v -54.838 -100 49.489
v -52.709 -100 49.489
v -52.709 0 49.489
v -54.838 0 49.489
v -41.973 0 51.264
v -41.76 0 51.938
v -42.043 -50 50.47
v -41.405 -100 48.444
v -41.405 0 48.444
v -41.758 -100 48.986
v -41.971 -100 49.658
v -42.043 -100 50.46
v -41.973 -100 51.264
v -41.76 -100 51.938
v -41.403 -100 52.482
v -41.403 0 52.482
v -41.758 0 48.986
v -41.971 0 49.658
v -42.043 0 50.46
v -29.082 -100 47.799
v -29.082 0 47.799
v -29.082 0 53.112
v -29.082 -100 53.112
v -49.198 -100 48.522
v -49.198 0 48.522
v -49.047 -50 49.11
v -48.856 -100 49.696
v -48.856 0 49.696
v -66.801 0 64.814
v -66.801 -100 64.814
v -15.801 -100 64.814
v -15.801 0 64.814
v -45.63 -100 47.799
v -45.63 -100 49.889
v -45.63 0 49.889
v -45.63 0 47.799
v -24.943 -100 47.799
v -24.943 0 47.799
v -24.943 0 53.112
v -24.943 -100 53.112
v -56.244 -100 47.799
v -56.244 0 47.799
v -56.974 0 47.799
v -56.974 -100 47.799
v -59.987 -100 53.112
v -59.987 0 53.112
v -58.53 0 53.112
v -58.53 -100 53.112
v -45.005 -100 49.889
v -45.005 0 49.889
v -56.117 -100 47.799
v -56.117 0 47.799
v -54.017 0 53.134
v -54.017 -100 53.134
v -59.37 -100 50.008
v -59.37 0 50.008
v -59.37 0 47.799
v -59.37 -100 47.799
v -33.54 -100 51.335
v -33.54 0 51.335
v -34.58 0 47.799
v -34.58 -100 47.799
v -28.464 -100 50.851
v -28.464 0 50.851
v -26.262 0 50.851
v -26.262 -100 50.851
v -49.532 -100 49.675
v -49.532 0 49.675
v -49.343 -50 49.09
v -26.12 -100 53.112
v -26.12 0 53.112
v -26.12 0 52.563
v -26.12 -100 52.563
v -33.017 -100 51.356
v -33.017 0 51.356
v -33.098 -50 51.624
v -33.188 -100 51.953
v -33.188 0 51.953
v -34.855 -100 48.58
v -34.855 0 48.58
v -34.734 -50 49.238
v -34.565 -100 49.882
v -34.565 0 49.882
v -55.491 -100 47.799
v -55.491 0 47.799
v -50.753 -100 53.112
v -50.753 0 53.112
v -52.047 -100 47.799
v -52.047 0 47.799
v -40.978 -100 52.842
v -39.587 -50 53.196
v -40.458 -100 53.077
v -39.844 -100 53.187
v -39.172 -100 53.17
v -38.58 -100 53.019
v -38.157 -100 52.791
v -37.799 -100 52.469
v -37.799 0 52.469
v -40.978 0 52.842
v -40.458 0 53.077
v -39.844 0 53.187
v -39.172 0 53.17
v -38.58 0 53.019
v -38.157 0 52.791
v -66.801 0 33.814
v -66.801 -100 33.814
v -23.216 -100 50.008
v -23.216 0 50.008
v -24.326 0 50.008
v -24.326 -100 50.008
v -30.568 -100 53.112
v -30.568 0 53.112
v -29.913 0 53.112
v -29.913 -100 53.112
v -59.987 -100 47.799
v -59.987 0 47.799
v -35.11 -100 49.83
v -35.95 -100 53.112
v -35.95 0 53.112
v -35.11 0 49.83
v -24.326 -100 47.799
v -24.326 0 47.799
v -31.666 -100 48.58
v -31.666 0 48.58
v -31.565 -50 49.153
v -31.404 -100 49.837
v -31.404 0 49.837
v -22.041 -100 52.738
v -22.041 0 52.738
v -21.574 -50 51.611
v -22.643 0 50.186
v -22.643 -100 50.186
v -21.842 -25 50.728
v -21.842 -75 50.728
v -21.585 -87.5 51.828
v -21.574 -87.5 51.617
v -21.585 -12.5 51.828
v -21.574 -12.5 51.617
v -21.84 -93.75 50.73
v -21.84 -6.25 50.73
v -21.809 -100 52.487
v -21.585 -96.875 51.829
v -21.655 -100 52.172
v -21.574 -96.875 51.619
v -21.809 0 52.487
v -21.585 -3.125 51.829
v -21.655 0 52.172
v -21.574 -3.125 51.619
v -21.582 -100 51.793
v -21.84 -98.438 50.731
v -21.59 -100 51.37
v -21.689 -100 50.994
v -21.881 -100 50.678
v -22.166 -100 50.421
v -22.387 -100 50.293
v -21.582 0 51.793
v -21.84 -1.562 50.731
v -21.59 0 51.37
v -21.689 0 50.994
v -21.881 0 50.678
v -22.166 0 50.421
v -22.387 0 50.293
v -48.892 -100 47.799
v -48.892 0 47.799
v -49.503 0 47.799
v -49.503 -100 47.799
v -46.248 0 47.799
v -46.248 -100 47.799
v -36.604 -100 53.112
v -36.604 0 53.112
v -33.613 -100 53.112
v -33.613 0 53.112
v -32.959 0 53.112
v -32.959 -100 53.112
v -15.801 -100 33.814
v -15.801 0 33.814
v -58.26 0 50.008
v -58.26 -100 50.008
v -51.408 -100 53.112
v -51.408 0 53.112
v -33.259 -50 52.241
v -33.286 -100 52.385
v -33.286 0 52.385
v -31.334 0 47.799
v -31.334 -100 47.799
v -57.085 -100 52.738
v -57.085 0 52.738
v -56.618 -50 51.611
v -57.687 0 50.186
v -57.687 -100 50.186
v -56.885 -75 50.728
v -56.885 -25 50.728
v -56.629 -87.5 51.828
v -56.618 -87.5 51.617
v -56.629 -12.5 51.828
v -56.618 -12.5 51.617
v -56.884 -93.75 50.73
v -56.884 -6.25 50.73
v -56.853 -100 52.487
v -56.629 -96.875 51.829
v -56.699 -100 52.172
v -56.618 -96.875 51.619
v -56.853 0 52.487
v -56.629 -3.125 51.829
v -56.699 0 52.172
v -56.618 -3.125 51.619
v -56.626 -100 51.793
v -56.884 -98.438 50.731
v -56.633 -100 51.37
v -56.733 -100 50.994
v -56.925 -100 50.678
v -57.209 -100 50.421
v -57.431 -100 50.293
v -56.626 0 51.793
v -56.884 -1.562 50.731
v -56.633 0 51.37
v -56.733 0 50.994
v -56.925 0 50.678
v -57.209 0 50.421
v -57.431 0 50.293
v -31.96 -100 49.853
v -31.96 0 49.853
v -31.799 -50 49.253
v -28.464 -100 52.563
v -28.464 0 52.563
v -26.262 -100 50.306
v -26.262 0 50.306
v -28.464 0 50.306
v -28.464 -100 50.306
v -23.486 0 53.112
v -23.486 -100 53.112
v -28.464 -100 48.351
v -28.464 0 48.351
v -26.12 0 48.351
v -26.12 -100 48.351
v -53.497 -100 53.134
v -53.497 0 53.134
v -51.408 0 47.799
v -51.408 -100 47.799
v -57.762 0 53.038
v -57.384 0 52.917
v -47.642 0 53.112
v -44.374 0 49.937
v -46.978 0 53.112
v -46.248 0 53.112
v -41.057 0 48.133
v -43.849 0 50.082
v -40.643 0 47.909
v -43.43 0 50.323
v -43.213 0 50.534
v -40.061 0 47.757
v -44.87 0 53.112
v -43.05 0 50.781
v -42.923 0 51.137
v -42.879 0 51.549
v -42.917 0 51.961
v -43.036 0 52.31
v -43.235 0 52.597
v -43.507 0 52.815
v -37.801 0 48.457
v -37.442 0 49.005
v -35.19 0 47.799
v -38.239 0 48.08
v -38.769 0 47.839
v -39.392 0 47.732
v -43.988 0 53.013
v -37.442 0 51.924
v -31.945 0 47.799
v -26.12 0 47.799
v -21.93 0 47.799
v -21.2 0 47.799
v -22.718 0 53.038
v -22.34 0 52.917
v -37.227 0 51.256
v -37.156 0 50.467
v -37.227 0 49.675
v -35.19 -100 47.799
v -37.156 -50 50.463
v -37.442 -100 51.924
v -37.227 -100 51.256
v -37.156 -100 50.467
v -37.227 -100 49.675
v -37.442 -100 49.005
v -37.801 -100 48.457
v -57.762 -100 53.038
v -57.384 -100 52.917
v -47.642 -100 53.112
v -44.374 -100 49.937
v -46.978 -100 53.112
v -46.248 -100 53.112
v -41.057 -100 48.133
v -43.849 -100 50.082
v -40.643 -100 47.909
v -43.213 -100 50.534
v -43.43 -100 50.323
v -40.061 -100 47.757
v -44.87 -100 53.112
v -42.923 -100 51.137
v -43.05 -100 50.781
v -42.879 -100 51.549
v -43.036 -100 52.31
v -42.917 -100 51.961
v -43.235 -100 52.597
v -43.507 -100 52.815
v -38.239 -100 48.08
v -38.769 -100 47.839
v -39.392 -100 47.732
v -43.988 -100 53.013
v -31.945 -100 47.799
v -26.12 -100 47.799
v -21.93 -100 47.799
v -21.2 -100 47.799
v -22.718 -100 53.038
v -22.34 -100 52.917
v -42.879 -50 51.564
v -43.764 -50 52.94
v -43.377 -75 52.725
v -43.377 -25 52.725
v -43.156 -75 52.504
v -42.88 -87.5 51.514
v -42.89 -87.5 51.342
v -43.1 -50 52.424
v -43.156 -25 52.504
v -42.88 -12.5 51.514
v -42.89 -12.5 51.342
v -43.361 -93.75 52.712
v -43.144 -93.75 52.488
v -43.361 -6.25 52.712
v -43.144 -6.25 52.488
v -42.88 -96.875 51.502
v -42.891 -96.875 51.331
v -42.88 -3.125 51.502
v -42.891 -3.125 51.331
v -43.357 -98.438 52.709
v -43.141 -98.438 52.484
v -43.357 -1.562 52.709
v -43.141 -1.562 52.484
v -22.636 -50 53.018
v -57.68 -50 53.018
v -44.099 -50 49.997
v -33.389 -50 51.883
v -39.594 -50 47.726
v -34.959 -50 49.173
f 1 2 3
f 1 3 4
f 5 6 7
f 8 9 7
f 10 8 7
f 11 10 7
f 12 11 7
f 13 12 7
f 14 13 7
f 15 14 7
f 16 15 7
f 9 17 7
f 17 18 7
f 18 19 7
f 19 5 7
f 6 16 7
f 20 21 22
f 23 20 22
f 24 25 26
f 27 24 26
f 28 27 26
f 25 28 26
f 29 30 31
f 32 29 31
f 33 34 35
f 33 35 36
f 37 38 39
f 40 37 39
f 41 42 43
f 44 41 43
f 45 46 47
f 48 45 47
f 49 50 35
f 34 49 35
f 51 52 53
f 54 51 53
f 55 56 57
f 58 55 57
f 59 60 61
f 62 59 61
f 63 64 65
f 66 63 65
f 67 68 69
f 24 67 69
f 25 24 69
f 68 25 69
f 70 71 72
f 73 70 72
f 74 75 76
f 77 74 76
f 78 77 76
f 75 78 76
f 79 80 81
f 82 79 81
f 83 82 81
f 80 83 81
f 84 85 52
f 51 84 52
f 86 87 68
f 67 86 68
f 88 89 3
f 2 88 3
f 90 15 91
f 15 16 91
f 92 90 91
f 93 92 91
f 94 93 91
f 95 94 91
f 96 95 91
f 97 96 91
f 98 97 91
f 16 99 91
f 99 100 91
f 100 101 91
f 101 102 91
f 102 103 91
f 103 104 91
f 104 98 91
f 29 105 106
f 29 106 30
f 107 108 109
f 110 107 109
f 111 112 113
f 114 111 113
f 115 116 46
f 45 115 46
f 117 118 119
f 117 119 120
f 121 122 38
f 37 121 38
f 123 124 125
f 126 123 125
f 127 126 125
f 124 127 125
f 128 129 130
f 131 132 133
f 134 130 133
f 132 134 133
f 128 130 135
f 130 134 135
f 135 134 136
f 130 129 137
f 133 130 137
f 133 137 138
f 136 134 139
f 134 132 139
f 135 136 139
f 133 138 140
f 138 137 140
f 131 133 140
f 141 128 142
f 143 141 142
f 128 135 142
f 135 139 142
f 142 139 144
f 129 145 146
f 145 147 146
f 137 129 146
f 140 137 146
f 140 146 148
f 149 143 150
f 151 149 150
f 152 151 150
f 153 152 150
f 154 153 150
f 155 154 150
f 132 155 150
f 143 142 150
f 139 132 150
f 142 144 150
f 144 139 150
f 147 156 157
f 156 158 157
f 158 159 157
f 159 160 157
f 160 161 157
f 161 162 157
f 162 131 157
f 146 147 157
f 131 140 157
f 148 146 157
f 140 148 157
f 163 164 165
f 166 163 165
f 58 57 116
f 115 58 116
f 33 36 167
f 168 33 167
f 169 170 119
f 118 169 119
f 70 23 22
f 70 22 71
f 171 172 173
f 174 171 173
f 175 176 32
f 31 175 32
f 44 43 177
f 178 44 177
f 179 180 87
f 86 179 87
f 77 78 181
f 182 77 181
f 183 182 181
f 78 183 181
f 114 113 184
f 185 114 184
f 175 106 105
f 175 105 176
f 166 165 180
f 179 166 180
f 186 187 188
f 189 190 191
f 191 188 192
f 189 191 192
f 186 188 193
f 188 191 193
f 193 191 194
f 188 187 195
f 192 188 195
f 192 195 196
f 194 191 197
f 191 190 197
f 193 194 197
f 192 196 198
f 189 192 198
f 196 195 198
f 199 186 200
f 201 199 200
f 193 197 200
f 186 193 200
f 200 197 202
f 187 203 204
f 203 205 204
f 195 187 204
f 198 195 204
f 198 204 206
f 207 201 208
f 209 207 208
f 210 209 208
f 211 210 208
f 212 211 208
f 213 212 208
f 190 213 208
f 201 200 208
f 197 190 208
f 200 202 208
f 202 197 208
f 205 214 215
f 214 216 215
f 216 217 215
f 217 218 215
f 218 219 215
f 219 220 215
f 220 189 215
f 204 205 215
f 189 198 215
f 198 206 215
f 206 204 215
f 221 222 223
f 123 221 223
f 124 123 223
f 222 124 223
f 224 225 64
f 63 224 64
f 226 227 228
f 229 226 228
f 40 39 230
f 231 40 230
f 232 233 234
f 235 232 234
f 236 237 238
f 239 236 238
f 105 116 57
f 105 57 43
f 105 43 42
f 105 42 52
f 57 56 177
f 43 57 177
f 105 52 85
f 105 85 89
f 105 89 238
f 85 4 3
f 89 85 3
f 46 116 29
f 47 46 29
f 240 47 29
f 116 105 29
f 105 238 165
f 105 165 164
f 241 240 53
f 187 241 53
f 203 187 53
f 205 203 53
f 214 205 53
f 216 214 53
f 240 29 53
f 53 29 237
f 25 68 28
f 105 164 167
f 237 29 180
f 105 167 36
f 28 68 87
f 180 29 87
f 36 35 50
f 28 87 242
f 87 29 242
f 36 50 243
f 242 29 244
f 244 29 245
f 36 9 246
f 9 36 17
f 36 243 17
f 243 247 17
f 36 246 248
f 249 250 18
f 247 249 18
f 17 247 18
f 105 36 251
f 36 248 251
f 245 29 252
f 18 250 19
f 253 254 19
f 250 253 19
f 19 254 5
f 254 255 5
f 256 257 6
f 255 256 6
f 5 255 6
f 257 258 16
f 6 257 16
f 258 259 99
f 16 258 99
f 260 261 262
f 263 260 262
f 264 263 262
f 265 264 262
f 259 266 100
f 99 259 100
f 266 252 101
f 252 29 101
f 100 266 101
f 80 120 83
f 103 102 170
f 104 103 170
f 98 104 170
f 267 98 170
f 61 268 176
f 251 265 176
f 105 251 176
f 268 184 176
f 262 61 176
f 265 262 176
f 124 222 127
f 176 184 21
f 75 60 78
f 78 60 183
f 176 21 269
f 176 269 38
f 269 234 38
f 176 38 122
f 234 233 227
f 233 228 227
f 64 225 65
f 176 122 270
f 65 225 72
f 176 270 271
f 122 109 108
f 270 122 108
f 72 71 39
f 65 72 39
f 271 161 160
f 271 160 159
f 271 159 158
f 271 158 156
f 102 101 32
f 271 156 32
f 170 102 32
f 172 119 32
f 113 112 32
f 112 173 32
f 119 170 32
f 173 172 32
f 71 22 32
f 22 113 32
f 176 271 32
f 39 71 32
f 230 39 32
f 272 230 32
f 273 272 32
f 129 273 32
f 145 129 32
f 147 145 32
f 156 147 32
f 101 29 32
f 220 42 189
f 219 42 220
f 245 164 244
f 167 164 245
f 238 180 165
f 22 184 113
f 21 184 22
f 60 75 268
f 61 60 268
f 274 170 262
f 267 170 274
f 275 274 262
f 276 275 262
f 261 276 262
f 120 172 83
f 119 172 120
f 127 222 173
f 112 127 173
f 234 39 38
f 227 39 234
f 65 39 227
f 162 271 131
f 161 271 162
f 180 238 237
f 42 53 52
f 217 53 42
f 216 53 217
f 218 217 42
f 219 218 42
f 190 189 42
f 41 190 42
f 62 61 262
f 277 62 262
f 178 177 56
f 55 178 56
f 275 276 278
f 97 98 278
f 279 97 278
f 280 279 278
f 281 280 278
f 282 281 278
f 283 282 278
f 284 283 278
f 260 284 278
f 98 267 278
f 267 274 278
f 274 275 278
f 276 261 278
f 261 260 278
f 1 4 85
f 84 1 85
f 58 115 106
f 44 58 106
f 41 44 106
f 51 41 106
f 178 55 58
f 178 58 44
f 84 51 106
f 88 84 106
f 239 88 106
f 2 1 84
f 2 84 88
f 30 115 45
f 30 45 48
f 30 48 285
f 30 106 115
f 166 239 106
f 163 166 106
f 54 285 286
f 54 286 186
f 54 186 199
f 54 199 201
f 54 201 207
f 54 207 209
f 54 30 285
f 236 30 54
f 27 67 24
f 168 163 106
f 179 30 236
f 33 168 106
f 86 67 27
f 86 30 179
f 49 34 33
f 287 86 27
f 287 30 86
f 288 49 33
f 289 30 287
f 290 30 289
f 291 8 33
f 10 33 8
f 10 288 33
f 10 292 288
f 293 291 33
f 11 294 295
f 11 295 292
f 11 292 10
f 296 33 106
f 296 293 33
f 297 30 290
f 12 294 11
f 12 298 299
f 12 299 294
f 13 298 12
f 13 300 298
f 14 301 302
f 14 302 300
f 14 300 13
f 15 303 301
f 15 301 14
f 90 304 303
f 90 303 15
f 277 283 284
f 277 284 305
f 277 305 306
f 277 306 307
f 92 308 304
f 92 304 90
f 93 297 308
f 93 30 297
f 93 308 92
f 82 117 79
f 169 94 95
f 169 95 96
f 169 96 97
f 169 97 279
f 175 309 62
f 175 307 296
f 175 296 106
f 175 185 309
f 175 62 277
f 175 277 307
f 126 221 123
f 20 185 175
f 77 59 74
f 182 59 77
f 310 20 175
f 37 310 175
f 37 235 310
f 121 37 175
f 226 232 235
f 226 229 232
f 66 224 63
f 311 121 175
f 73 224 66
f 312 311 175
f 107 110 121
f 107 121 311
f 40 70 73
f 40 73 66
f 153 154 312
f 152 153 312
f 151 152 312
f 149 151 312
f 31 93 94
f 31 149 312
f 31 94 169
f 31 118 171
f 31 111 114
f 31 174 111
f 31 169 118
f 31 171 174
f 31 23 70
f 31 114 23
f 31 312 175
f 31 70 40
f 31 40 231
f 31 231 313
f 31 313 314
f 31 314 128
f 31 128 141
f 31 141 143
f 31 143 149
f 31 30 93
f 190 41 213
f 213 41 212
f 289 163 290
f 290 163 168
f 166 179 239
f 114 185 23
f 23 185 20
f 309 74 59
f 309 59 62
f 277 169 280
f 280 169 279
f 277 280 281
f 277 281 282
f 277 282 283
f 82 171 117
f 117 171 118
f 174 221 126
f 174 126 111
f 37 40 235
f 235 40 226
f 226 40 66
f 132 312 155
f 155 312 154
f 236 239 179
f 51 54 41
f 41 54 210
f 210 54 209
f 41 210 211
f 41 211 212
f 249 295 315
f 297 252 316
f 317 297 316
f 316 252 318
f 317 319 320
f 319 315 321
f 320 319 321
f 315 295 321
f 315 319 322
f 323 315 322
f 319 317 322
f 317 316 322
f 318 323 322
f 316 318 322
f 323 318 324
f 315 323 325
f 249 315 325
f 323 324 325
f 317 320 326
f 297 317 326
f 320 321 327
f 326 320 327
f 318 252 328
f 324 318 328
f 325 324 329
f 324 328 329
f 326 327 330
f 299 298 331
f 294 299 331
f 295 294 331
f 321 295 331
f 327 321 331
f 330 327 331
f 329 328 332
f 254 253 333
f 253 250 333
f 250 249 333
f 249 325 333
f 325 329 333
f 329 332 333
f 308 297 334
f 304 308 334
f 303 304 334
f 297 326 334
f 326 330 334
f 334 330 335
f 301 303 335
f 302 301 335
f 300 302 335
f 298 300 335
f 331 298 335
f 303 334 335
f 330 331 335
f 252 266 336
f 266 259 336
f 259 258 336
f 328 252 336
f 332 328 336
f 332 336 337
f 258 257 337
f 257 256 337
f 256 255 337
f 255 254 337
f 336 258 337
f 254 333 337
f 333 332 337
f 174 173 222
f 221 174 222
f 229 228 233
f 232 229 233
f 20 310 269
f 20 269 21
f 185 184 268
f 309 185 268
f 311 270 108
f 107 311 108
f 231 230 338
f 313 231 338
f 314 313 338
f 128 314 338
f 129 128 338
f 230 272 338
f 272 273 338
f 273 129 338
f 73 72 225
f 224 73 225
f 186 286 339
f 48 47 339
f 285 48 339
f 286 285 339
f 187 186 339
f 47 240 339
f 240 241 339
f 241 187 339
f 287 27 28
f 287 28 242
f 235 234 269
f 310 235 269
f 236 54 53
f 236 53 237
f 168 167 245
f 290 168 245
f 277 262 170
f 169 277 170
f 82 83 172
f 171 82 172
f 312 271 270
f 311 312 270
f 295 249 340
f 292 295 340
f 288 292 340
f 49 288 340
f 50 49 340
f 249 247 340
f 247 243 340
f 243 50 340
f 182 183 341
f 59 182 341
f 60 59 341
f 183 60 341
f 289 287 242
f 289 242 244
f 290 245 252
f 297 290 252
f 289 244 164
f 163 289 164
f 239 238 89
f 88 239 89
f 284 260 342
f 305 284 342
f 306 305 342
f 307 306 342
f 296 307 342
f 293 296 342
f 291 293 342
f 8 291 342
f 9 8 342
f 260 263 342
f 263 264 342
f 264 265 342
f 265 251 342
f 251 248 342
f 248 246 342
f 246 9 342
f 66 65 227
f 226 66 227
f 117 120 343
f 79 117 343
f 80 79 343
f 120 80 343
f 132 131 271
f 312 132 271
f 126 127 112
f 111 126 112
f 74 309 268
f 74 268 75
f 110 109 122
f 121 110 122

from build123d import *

# Parameters (mm, degrees)
F0_W     = 51
F0_H     = 31
F1_DEPTH = 100


with BuildPart() as f1:
    # F0 (on Front) → F1 (new body)
    with BuildSketch(Plane.XZ):
        with Locations((-41.3011932845, 49.3138737511)):
            Rectangle(F0_W, F0_H)
        with BuildLine():
            Line((-58.2602472687, 50.0083940445), (-59.3696140923, 50.0083940445))
            Line((-59.3696140923, 50.0083940445), (-59.3696140923, 47.7989632636))
            Line((-59.3696140923, 47.7989632636), (-59.9870918526, 47.7989632636))
            Line((-59.9870918526, 47.7989632636), (-59.9870918526, 53.1120628624))
            Line((-59.9870918526, 53.1120628624), (-58.5300303956, 53.1120628624))
            add(Edge.make_bspline(
                [(-58.5300303956, 53.1120628624), (-57.5520665605, 53.1120628624), (-57.0851789507, 52.737622488)],
                knots=[0, 0, 0, 1, 1, 1], degree=2))
            add(Edge.make_bspline(
                [(-57.0851789507, 52.737622488), (-56.618291341, 52.3631821136), (-56.618291341, 51.6108127898)],
                knots=[0, 0, 0, 1, 1, 1], degree=2))
            add(Edge.make_bspline(
                [(-56.618291341, 51.6108127898), (-56.618291341, 50.5572631648), (-57.6869581239, 50.1863113653)],
                knots=[0, 0, 0, 1, 1, 1], degree=2))
            Line((-57.6869581239, 50.1863113653), (-56.2438509665, 47.7989632636))
            Line((-56.2438509665, 47.7989632636), (-56.9741259825, 47.7989632636))
            Line((-56.9741259825, 47.7989632636), (-58.2602472687, 50.0083940445))
        make_face(mode=Mode.SUBTRACT)
        Polygon((-51.4075232731, 47.7989632636), (-52.0470953412, 47.7989632636), (-52.7087617172, 49.4885963818), (-54.8379552749, 49.4885963818), (-55.4914816427, 47.7989632636), (-56.1170994112, 47.7989632636), (-54.0169773111, 53.1341571703), (-53.4971796484, 53.1341571703), align=None, mode=Mode.SUBTRACT)
        with BuildLine():
            Line((-48.8562121503, 49.6955851603), (-47.6421880792, 53.1120628624))
            Line((-47.6421880792, 53.1120628624), (-46.9781959866, 53.1120628624))
            Line((-46.9781959866, 53.1120628624), (-48.8922607578, 47.7989632636))
            Line((-48.8922607578, 47.7989632636), (-49.5027613683, 47.7989632636))
            Line((-49.5027613683, 47.7989632636), (-51.4075232731, 53.1120628624))
            Line((-51.4075232731, 53.1120628624), (-50.752834047, 53.1120628624))
            Line((-50.752834047, 53.1120628624), (-49.531832826, 49.6746537107))
            add(Edge.make_bspline(
                [(-49.531832826, 49.6746537107), (-49.3213554726, 49.0815959748), (-49.1980924922, 48.5222611298)],
                knots=[0, 0, 0, 1, 1, 1], degree=2))
            add(Edge.make_bspline(
                [(-49.1980924922, 48.5222611298), (-49.0666895037, 49.1106674325), (-48.8562121503, 49.6955851603)],
                knots=[0, 0, 0, 1, 1, 1], degree=2))
        make_face(mode=Mode.SUBTRACT)
        with BuildLine():
            add(Edge.make_bspline(
                [(-44.8699338783, 53.1120628624), (-42.879120459, 53.1120628624), (-42.879120459, 51.5642984575)],
                knots=[0, 0, 0, 1, 1, 1], degree=2))
            add(Edge.make_bspline(
                [(-42.879120459, 51.5642984575), (-42.879120459, 50.7572747934), (-43.4297338667, 50.3229472162)],
                knots=[0, 0, 0, 1, 1, 1], degree=2))
            add(Edge.make_bspline(
                [(-43.4297338667, 50.3229472162), (-43.9803472745, 49.888619639), (-45.0048254418, 49.888619639)],
                knots=[0, 0, 0, 1, 1, 1], degree=2))
            Line((-45.0048254418, 49.888619639), (-45.6304432103, 49.888619639))
            Line((-45.6304432103, 49.888619639), (-45.6304432103, 47.7989632636))
            Line((-45.6304432103, 47.7989632636), (-46.2479209706, 47.7989632636))
            Line((-46.2479209706, 47.7989632636), (-46.2479209706, 53.1120628624))
            Line((-46.2479209706, 53.1120628624), (-44.8699338783, 53.1120628624))
        make_face(mode=Mode.SUBTRACT)
        with BuildLine():
            add(Edge.make_bspline(
                [(-37.7985925213, 52.4690022194), (-37.1555318782, 51.7422157783), (-37.1555318782, 50.463071642)],
                knots=[0, 0, 0, 1, 1, 1], degree=2))
            add(Edge.make_bspline(
                [(-37.1555318782, 50.463071642), (-37.1555318782, 49.1874160807), (-37.8009182379, 48.4565596355)],
                knots=[0, 0, 0, 1, 1, 1], degree=2))
            add(Edge.make_bspline(
                [(-37.8009182379, 48.4565596355), (-38.4463045976, 47.7257031904), (-39.5940457453, 47.7257031904)],
                knots=[0, 0, 0, 1, 1, 1], degree=2))
            add(Edge.make_bspline(
                [(-39.5940457453, 47.7257031904), (-40.7673697758, 47.7257031904), (-41.4051975565, 48.4437681942)],
                knots=[0, 0, 0, 1, 1, 1], degree=2))
            add(Edge.make_bspline(
                [(-41.4051975565, 48.4437681942), (-42.0430253371, 49.1618331979), (-42.0430253371, 50.4700487919)],
                knots=[0, 0, 0, 1, 1, 1], degree=2))
            add(Edge.make_bspline(
                [(-42.0430253371, 50.4700487919), (-42.0430253371, 51.767798661), (-41.403453269, 52.4817936607)],
                knots=[0, 0, 0, 1, 1, 1], degree=2))
            add(Edge.make_bspline(
                [(-41.403453269, 52.4817936607), (-40.7638812009, 53.1957886605), (-39.5870685955, 53.1957886605)],
                knots=[0, 0, 0, 1, 1, 1], degree=2))
            add(Edge.make_bspline(
                [(-39.5870685955, 53.1957886605), (-38.4416531643, 53.1957886605), (-37.7985925213, 52.4690022194)],
                knots=[0, 0, 0, 1, 1, 1], degree=2))
        make_face(mode=Mode.SUBTRACT)
        with BuildLine():
            Line((-29.9132503502, 53.1120628624), (-31.3342631998, 47.7989632636))
            Line((-31.3342631998, 47.7989632636), (-31.9447638103, 47.7989632636))
            Line((-31.9447638103, 47.7989632636), (-33.0169191682, 51.3561468208))
            add(Edge.make_bspline(
                [(-33.0169191682, 51.3561468208), (-33.0936678164, 51.5933699152), (-33.1878593391, 51.9526931316)],
                knots=[0, 0, 0, 1, 1, 1], degree=2))
            add(Edge.make_bspline(
                [(-33.1878593391, 51.9526931316), (-33.2820508619, 52.3120163481), (-33.2855394368, 52.3852764214)],
                knots=[0, 0, 0, 1, 1, 1], degree=2))
            add(Edge.make_bspline(
                [(-33.2855394368, 52.3852764214), (-33.3657766599, 51.9050159411), (-33.5402054058, 51.3352153713)],
                knots=[0, 0, 0, 1, 1, 1], degree=2))
            Line((-33.5402054058, 51.3352153713), (-34.5798007311, 47.7989632636))
            Line((-34.5798007311, 47.7989632636), (-35.1903013416, 47.7989632636))
            Line((-35.1903013416, 47.7989632636), (-36.6043370413, 53.1120628624))
            Line((-36.6043370413, 53.1120628624), (-35.9496478152, 53.1120628624))
            Line((-35.9496478152, 53.1120628624), (-35.1100641185, 49.8304767237))
            add(Edge.make_bspline(
                [(-35.1100641185, 49.8304767237), (-34.9356353726, 49.1397388901), (-34.8553981495, 48.5804040451)],
                knots=[0, 0, 0, 1, 1, 1], degree=2))
            add(Edge.make_bspline(
                [(-34.8553981495, 48.5804040451), (-34.7577180518, 49.2455589959), (-34.5646835731, 49.8816424892)],
                knots=[0, 0, 0, 1, 1, 1], degree=2))
            Line((-34.5646835731, 49.8816424892), (-33.613465479, 53.1120628624))
            Line((-33.613465479, 53.1120628624), (-32.9587762529, 53.1120628624))
            Line((-32.9587762529, 53.1120628624), (-31.9598809683, 49.8525710315))
            add(Edge.make_bspline(
                [(-31.9598809683, 49.8525710315), (-31.7854522224, 49.2885847533), (-31.6656778169, 48.5804040451)],
                knots=[0, 0, 0, 1, 1, 1], degree=2))
            add(Edge.make_bspline(
                [(-31.6656778169, 48.5804040451), (-31.5959063186, 49.0967131328), (-31.4040346982, 49.8374538736)],
                knots=[0, 0, 0, 1, 1, 1], degree=2))
            Line((-31.4040346982, 49.8374538736), (-30.5679395763, 53.1120628624))
            Line((-30.5679395763, 53.1120628624), (-29.9132503502, 53.1120628624))
        make_face(mode=Mode.SUBTRACT)
        Polygon((-26.120006557, 48.3513209588), (-26.120006557, 47.7989632636), (-29.0818066616, 47.7989632636), (-29.0818066616, 53.1120628624), (-26.120006557, 53.1120628624), (-26.120006557, 52.5631937421), (-28.4643289013, 52.5631937421), (-28.4643289013, 50.8514663161), (-26.2618752703, 50.8514663161), (-26.2618752703, 50.3060857708), (-28.4643289013, 50.3060857708), (-28.4643289013, 48.3513209588), align=None, mode=Mode.SUBTRACT)
        with BuildLine():
            Line((-23.2163493676, 50.0083940445), (-24.3257161913, 50.0083940445))
            Line((-24.3257161913, 50.0083940445), (-24.3257161913, 47.7989632636))
            Line((-24.3257161913, 47.7989632636), (-24.9431939516, 47.7989632636))
            Line((-24.9431939516, 47.7989632636), (-24.9431939516, 53.1120628624))
            Line((-24.9431939516, 53.1120628624), (-23.4861324945, 53.1120628624))
            add(Edge.make_bspline(
                [(-23.4861324945, 53.1120628624), (-22.5081686594, 53.1120628624), (-22.0412810497, 52.737622488)],
                knots=[0, 0, 0, 1, 1, 1], degree=2))
            add(Edge.make_bspline(
                [(-22.0412810497, 52.737622488), (-21.5743934399, 52.3631821136), (-21.5743934399, 51.6108127898)],
                knots=[0, 0, 0, 1, 1, 1], degree=2))
            add(Edge.make_bspline(
                [(-21.5743934399, 51.6108127898), (-21.5743934399, 50.5572631648), (-22.6430602229, 50.1863113653)],
                knots=[0, 0, 0, 1, 1, 1], degree=2))
            Line((-22.6430602229, 50.1863113653), (-21.1999530655, 47.7989632636))
            Line((-21.1999530655, 47.7989632636), (-21.9302280815, 47.7989632636))
            Line((-21.9302280815, 47.7989632636), (-23.2163493676, 50.0083940445))
        make_face(mode=Mode.SUBTRACT)
    extrude(amount=F1_DEPTH)


solid = f1.part
